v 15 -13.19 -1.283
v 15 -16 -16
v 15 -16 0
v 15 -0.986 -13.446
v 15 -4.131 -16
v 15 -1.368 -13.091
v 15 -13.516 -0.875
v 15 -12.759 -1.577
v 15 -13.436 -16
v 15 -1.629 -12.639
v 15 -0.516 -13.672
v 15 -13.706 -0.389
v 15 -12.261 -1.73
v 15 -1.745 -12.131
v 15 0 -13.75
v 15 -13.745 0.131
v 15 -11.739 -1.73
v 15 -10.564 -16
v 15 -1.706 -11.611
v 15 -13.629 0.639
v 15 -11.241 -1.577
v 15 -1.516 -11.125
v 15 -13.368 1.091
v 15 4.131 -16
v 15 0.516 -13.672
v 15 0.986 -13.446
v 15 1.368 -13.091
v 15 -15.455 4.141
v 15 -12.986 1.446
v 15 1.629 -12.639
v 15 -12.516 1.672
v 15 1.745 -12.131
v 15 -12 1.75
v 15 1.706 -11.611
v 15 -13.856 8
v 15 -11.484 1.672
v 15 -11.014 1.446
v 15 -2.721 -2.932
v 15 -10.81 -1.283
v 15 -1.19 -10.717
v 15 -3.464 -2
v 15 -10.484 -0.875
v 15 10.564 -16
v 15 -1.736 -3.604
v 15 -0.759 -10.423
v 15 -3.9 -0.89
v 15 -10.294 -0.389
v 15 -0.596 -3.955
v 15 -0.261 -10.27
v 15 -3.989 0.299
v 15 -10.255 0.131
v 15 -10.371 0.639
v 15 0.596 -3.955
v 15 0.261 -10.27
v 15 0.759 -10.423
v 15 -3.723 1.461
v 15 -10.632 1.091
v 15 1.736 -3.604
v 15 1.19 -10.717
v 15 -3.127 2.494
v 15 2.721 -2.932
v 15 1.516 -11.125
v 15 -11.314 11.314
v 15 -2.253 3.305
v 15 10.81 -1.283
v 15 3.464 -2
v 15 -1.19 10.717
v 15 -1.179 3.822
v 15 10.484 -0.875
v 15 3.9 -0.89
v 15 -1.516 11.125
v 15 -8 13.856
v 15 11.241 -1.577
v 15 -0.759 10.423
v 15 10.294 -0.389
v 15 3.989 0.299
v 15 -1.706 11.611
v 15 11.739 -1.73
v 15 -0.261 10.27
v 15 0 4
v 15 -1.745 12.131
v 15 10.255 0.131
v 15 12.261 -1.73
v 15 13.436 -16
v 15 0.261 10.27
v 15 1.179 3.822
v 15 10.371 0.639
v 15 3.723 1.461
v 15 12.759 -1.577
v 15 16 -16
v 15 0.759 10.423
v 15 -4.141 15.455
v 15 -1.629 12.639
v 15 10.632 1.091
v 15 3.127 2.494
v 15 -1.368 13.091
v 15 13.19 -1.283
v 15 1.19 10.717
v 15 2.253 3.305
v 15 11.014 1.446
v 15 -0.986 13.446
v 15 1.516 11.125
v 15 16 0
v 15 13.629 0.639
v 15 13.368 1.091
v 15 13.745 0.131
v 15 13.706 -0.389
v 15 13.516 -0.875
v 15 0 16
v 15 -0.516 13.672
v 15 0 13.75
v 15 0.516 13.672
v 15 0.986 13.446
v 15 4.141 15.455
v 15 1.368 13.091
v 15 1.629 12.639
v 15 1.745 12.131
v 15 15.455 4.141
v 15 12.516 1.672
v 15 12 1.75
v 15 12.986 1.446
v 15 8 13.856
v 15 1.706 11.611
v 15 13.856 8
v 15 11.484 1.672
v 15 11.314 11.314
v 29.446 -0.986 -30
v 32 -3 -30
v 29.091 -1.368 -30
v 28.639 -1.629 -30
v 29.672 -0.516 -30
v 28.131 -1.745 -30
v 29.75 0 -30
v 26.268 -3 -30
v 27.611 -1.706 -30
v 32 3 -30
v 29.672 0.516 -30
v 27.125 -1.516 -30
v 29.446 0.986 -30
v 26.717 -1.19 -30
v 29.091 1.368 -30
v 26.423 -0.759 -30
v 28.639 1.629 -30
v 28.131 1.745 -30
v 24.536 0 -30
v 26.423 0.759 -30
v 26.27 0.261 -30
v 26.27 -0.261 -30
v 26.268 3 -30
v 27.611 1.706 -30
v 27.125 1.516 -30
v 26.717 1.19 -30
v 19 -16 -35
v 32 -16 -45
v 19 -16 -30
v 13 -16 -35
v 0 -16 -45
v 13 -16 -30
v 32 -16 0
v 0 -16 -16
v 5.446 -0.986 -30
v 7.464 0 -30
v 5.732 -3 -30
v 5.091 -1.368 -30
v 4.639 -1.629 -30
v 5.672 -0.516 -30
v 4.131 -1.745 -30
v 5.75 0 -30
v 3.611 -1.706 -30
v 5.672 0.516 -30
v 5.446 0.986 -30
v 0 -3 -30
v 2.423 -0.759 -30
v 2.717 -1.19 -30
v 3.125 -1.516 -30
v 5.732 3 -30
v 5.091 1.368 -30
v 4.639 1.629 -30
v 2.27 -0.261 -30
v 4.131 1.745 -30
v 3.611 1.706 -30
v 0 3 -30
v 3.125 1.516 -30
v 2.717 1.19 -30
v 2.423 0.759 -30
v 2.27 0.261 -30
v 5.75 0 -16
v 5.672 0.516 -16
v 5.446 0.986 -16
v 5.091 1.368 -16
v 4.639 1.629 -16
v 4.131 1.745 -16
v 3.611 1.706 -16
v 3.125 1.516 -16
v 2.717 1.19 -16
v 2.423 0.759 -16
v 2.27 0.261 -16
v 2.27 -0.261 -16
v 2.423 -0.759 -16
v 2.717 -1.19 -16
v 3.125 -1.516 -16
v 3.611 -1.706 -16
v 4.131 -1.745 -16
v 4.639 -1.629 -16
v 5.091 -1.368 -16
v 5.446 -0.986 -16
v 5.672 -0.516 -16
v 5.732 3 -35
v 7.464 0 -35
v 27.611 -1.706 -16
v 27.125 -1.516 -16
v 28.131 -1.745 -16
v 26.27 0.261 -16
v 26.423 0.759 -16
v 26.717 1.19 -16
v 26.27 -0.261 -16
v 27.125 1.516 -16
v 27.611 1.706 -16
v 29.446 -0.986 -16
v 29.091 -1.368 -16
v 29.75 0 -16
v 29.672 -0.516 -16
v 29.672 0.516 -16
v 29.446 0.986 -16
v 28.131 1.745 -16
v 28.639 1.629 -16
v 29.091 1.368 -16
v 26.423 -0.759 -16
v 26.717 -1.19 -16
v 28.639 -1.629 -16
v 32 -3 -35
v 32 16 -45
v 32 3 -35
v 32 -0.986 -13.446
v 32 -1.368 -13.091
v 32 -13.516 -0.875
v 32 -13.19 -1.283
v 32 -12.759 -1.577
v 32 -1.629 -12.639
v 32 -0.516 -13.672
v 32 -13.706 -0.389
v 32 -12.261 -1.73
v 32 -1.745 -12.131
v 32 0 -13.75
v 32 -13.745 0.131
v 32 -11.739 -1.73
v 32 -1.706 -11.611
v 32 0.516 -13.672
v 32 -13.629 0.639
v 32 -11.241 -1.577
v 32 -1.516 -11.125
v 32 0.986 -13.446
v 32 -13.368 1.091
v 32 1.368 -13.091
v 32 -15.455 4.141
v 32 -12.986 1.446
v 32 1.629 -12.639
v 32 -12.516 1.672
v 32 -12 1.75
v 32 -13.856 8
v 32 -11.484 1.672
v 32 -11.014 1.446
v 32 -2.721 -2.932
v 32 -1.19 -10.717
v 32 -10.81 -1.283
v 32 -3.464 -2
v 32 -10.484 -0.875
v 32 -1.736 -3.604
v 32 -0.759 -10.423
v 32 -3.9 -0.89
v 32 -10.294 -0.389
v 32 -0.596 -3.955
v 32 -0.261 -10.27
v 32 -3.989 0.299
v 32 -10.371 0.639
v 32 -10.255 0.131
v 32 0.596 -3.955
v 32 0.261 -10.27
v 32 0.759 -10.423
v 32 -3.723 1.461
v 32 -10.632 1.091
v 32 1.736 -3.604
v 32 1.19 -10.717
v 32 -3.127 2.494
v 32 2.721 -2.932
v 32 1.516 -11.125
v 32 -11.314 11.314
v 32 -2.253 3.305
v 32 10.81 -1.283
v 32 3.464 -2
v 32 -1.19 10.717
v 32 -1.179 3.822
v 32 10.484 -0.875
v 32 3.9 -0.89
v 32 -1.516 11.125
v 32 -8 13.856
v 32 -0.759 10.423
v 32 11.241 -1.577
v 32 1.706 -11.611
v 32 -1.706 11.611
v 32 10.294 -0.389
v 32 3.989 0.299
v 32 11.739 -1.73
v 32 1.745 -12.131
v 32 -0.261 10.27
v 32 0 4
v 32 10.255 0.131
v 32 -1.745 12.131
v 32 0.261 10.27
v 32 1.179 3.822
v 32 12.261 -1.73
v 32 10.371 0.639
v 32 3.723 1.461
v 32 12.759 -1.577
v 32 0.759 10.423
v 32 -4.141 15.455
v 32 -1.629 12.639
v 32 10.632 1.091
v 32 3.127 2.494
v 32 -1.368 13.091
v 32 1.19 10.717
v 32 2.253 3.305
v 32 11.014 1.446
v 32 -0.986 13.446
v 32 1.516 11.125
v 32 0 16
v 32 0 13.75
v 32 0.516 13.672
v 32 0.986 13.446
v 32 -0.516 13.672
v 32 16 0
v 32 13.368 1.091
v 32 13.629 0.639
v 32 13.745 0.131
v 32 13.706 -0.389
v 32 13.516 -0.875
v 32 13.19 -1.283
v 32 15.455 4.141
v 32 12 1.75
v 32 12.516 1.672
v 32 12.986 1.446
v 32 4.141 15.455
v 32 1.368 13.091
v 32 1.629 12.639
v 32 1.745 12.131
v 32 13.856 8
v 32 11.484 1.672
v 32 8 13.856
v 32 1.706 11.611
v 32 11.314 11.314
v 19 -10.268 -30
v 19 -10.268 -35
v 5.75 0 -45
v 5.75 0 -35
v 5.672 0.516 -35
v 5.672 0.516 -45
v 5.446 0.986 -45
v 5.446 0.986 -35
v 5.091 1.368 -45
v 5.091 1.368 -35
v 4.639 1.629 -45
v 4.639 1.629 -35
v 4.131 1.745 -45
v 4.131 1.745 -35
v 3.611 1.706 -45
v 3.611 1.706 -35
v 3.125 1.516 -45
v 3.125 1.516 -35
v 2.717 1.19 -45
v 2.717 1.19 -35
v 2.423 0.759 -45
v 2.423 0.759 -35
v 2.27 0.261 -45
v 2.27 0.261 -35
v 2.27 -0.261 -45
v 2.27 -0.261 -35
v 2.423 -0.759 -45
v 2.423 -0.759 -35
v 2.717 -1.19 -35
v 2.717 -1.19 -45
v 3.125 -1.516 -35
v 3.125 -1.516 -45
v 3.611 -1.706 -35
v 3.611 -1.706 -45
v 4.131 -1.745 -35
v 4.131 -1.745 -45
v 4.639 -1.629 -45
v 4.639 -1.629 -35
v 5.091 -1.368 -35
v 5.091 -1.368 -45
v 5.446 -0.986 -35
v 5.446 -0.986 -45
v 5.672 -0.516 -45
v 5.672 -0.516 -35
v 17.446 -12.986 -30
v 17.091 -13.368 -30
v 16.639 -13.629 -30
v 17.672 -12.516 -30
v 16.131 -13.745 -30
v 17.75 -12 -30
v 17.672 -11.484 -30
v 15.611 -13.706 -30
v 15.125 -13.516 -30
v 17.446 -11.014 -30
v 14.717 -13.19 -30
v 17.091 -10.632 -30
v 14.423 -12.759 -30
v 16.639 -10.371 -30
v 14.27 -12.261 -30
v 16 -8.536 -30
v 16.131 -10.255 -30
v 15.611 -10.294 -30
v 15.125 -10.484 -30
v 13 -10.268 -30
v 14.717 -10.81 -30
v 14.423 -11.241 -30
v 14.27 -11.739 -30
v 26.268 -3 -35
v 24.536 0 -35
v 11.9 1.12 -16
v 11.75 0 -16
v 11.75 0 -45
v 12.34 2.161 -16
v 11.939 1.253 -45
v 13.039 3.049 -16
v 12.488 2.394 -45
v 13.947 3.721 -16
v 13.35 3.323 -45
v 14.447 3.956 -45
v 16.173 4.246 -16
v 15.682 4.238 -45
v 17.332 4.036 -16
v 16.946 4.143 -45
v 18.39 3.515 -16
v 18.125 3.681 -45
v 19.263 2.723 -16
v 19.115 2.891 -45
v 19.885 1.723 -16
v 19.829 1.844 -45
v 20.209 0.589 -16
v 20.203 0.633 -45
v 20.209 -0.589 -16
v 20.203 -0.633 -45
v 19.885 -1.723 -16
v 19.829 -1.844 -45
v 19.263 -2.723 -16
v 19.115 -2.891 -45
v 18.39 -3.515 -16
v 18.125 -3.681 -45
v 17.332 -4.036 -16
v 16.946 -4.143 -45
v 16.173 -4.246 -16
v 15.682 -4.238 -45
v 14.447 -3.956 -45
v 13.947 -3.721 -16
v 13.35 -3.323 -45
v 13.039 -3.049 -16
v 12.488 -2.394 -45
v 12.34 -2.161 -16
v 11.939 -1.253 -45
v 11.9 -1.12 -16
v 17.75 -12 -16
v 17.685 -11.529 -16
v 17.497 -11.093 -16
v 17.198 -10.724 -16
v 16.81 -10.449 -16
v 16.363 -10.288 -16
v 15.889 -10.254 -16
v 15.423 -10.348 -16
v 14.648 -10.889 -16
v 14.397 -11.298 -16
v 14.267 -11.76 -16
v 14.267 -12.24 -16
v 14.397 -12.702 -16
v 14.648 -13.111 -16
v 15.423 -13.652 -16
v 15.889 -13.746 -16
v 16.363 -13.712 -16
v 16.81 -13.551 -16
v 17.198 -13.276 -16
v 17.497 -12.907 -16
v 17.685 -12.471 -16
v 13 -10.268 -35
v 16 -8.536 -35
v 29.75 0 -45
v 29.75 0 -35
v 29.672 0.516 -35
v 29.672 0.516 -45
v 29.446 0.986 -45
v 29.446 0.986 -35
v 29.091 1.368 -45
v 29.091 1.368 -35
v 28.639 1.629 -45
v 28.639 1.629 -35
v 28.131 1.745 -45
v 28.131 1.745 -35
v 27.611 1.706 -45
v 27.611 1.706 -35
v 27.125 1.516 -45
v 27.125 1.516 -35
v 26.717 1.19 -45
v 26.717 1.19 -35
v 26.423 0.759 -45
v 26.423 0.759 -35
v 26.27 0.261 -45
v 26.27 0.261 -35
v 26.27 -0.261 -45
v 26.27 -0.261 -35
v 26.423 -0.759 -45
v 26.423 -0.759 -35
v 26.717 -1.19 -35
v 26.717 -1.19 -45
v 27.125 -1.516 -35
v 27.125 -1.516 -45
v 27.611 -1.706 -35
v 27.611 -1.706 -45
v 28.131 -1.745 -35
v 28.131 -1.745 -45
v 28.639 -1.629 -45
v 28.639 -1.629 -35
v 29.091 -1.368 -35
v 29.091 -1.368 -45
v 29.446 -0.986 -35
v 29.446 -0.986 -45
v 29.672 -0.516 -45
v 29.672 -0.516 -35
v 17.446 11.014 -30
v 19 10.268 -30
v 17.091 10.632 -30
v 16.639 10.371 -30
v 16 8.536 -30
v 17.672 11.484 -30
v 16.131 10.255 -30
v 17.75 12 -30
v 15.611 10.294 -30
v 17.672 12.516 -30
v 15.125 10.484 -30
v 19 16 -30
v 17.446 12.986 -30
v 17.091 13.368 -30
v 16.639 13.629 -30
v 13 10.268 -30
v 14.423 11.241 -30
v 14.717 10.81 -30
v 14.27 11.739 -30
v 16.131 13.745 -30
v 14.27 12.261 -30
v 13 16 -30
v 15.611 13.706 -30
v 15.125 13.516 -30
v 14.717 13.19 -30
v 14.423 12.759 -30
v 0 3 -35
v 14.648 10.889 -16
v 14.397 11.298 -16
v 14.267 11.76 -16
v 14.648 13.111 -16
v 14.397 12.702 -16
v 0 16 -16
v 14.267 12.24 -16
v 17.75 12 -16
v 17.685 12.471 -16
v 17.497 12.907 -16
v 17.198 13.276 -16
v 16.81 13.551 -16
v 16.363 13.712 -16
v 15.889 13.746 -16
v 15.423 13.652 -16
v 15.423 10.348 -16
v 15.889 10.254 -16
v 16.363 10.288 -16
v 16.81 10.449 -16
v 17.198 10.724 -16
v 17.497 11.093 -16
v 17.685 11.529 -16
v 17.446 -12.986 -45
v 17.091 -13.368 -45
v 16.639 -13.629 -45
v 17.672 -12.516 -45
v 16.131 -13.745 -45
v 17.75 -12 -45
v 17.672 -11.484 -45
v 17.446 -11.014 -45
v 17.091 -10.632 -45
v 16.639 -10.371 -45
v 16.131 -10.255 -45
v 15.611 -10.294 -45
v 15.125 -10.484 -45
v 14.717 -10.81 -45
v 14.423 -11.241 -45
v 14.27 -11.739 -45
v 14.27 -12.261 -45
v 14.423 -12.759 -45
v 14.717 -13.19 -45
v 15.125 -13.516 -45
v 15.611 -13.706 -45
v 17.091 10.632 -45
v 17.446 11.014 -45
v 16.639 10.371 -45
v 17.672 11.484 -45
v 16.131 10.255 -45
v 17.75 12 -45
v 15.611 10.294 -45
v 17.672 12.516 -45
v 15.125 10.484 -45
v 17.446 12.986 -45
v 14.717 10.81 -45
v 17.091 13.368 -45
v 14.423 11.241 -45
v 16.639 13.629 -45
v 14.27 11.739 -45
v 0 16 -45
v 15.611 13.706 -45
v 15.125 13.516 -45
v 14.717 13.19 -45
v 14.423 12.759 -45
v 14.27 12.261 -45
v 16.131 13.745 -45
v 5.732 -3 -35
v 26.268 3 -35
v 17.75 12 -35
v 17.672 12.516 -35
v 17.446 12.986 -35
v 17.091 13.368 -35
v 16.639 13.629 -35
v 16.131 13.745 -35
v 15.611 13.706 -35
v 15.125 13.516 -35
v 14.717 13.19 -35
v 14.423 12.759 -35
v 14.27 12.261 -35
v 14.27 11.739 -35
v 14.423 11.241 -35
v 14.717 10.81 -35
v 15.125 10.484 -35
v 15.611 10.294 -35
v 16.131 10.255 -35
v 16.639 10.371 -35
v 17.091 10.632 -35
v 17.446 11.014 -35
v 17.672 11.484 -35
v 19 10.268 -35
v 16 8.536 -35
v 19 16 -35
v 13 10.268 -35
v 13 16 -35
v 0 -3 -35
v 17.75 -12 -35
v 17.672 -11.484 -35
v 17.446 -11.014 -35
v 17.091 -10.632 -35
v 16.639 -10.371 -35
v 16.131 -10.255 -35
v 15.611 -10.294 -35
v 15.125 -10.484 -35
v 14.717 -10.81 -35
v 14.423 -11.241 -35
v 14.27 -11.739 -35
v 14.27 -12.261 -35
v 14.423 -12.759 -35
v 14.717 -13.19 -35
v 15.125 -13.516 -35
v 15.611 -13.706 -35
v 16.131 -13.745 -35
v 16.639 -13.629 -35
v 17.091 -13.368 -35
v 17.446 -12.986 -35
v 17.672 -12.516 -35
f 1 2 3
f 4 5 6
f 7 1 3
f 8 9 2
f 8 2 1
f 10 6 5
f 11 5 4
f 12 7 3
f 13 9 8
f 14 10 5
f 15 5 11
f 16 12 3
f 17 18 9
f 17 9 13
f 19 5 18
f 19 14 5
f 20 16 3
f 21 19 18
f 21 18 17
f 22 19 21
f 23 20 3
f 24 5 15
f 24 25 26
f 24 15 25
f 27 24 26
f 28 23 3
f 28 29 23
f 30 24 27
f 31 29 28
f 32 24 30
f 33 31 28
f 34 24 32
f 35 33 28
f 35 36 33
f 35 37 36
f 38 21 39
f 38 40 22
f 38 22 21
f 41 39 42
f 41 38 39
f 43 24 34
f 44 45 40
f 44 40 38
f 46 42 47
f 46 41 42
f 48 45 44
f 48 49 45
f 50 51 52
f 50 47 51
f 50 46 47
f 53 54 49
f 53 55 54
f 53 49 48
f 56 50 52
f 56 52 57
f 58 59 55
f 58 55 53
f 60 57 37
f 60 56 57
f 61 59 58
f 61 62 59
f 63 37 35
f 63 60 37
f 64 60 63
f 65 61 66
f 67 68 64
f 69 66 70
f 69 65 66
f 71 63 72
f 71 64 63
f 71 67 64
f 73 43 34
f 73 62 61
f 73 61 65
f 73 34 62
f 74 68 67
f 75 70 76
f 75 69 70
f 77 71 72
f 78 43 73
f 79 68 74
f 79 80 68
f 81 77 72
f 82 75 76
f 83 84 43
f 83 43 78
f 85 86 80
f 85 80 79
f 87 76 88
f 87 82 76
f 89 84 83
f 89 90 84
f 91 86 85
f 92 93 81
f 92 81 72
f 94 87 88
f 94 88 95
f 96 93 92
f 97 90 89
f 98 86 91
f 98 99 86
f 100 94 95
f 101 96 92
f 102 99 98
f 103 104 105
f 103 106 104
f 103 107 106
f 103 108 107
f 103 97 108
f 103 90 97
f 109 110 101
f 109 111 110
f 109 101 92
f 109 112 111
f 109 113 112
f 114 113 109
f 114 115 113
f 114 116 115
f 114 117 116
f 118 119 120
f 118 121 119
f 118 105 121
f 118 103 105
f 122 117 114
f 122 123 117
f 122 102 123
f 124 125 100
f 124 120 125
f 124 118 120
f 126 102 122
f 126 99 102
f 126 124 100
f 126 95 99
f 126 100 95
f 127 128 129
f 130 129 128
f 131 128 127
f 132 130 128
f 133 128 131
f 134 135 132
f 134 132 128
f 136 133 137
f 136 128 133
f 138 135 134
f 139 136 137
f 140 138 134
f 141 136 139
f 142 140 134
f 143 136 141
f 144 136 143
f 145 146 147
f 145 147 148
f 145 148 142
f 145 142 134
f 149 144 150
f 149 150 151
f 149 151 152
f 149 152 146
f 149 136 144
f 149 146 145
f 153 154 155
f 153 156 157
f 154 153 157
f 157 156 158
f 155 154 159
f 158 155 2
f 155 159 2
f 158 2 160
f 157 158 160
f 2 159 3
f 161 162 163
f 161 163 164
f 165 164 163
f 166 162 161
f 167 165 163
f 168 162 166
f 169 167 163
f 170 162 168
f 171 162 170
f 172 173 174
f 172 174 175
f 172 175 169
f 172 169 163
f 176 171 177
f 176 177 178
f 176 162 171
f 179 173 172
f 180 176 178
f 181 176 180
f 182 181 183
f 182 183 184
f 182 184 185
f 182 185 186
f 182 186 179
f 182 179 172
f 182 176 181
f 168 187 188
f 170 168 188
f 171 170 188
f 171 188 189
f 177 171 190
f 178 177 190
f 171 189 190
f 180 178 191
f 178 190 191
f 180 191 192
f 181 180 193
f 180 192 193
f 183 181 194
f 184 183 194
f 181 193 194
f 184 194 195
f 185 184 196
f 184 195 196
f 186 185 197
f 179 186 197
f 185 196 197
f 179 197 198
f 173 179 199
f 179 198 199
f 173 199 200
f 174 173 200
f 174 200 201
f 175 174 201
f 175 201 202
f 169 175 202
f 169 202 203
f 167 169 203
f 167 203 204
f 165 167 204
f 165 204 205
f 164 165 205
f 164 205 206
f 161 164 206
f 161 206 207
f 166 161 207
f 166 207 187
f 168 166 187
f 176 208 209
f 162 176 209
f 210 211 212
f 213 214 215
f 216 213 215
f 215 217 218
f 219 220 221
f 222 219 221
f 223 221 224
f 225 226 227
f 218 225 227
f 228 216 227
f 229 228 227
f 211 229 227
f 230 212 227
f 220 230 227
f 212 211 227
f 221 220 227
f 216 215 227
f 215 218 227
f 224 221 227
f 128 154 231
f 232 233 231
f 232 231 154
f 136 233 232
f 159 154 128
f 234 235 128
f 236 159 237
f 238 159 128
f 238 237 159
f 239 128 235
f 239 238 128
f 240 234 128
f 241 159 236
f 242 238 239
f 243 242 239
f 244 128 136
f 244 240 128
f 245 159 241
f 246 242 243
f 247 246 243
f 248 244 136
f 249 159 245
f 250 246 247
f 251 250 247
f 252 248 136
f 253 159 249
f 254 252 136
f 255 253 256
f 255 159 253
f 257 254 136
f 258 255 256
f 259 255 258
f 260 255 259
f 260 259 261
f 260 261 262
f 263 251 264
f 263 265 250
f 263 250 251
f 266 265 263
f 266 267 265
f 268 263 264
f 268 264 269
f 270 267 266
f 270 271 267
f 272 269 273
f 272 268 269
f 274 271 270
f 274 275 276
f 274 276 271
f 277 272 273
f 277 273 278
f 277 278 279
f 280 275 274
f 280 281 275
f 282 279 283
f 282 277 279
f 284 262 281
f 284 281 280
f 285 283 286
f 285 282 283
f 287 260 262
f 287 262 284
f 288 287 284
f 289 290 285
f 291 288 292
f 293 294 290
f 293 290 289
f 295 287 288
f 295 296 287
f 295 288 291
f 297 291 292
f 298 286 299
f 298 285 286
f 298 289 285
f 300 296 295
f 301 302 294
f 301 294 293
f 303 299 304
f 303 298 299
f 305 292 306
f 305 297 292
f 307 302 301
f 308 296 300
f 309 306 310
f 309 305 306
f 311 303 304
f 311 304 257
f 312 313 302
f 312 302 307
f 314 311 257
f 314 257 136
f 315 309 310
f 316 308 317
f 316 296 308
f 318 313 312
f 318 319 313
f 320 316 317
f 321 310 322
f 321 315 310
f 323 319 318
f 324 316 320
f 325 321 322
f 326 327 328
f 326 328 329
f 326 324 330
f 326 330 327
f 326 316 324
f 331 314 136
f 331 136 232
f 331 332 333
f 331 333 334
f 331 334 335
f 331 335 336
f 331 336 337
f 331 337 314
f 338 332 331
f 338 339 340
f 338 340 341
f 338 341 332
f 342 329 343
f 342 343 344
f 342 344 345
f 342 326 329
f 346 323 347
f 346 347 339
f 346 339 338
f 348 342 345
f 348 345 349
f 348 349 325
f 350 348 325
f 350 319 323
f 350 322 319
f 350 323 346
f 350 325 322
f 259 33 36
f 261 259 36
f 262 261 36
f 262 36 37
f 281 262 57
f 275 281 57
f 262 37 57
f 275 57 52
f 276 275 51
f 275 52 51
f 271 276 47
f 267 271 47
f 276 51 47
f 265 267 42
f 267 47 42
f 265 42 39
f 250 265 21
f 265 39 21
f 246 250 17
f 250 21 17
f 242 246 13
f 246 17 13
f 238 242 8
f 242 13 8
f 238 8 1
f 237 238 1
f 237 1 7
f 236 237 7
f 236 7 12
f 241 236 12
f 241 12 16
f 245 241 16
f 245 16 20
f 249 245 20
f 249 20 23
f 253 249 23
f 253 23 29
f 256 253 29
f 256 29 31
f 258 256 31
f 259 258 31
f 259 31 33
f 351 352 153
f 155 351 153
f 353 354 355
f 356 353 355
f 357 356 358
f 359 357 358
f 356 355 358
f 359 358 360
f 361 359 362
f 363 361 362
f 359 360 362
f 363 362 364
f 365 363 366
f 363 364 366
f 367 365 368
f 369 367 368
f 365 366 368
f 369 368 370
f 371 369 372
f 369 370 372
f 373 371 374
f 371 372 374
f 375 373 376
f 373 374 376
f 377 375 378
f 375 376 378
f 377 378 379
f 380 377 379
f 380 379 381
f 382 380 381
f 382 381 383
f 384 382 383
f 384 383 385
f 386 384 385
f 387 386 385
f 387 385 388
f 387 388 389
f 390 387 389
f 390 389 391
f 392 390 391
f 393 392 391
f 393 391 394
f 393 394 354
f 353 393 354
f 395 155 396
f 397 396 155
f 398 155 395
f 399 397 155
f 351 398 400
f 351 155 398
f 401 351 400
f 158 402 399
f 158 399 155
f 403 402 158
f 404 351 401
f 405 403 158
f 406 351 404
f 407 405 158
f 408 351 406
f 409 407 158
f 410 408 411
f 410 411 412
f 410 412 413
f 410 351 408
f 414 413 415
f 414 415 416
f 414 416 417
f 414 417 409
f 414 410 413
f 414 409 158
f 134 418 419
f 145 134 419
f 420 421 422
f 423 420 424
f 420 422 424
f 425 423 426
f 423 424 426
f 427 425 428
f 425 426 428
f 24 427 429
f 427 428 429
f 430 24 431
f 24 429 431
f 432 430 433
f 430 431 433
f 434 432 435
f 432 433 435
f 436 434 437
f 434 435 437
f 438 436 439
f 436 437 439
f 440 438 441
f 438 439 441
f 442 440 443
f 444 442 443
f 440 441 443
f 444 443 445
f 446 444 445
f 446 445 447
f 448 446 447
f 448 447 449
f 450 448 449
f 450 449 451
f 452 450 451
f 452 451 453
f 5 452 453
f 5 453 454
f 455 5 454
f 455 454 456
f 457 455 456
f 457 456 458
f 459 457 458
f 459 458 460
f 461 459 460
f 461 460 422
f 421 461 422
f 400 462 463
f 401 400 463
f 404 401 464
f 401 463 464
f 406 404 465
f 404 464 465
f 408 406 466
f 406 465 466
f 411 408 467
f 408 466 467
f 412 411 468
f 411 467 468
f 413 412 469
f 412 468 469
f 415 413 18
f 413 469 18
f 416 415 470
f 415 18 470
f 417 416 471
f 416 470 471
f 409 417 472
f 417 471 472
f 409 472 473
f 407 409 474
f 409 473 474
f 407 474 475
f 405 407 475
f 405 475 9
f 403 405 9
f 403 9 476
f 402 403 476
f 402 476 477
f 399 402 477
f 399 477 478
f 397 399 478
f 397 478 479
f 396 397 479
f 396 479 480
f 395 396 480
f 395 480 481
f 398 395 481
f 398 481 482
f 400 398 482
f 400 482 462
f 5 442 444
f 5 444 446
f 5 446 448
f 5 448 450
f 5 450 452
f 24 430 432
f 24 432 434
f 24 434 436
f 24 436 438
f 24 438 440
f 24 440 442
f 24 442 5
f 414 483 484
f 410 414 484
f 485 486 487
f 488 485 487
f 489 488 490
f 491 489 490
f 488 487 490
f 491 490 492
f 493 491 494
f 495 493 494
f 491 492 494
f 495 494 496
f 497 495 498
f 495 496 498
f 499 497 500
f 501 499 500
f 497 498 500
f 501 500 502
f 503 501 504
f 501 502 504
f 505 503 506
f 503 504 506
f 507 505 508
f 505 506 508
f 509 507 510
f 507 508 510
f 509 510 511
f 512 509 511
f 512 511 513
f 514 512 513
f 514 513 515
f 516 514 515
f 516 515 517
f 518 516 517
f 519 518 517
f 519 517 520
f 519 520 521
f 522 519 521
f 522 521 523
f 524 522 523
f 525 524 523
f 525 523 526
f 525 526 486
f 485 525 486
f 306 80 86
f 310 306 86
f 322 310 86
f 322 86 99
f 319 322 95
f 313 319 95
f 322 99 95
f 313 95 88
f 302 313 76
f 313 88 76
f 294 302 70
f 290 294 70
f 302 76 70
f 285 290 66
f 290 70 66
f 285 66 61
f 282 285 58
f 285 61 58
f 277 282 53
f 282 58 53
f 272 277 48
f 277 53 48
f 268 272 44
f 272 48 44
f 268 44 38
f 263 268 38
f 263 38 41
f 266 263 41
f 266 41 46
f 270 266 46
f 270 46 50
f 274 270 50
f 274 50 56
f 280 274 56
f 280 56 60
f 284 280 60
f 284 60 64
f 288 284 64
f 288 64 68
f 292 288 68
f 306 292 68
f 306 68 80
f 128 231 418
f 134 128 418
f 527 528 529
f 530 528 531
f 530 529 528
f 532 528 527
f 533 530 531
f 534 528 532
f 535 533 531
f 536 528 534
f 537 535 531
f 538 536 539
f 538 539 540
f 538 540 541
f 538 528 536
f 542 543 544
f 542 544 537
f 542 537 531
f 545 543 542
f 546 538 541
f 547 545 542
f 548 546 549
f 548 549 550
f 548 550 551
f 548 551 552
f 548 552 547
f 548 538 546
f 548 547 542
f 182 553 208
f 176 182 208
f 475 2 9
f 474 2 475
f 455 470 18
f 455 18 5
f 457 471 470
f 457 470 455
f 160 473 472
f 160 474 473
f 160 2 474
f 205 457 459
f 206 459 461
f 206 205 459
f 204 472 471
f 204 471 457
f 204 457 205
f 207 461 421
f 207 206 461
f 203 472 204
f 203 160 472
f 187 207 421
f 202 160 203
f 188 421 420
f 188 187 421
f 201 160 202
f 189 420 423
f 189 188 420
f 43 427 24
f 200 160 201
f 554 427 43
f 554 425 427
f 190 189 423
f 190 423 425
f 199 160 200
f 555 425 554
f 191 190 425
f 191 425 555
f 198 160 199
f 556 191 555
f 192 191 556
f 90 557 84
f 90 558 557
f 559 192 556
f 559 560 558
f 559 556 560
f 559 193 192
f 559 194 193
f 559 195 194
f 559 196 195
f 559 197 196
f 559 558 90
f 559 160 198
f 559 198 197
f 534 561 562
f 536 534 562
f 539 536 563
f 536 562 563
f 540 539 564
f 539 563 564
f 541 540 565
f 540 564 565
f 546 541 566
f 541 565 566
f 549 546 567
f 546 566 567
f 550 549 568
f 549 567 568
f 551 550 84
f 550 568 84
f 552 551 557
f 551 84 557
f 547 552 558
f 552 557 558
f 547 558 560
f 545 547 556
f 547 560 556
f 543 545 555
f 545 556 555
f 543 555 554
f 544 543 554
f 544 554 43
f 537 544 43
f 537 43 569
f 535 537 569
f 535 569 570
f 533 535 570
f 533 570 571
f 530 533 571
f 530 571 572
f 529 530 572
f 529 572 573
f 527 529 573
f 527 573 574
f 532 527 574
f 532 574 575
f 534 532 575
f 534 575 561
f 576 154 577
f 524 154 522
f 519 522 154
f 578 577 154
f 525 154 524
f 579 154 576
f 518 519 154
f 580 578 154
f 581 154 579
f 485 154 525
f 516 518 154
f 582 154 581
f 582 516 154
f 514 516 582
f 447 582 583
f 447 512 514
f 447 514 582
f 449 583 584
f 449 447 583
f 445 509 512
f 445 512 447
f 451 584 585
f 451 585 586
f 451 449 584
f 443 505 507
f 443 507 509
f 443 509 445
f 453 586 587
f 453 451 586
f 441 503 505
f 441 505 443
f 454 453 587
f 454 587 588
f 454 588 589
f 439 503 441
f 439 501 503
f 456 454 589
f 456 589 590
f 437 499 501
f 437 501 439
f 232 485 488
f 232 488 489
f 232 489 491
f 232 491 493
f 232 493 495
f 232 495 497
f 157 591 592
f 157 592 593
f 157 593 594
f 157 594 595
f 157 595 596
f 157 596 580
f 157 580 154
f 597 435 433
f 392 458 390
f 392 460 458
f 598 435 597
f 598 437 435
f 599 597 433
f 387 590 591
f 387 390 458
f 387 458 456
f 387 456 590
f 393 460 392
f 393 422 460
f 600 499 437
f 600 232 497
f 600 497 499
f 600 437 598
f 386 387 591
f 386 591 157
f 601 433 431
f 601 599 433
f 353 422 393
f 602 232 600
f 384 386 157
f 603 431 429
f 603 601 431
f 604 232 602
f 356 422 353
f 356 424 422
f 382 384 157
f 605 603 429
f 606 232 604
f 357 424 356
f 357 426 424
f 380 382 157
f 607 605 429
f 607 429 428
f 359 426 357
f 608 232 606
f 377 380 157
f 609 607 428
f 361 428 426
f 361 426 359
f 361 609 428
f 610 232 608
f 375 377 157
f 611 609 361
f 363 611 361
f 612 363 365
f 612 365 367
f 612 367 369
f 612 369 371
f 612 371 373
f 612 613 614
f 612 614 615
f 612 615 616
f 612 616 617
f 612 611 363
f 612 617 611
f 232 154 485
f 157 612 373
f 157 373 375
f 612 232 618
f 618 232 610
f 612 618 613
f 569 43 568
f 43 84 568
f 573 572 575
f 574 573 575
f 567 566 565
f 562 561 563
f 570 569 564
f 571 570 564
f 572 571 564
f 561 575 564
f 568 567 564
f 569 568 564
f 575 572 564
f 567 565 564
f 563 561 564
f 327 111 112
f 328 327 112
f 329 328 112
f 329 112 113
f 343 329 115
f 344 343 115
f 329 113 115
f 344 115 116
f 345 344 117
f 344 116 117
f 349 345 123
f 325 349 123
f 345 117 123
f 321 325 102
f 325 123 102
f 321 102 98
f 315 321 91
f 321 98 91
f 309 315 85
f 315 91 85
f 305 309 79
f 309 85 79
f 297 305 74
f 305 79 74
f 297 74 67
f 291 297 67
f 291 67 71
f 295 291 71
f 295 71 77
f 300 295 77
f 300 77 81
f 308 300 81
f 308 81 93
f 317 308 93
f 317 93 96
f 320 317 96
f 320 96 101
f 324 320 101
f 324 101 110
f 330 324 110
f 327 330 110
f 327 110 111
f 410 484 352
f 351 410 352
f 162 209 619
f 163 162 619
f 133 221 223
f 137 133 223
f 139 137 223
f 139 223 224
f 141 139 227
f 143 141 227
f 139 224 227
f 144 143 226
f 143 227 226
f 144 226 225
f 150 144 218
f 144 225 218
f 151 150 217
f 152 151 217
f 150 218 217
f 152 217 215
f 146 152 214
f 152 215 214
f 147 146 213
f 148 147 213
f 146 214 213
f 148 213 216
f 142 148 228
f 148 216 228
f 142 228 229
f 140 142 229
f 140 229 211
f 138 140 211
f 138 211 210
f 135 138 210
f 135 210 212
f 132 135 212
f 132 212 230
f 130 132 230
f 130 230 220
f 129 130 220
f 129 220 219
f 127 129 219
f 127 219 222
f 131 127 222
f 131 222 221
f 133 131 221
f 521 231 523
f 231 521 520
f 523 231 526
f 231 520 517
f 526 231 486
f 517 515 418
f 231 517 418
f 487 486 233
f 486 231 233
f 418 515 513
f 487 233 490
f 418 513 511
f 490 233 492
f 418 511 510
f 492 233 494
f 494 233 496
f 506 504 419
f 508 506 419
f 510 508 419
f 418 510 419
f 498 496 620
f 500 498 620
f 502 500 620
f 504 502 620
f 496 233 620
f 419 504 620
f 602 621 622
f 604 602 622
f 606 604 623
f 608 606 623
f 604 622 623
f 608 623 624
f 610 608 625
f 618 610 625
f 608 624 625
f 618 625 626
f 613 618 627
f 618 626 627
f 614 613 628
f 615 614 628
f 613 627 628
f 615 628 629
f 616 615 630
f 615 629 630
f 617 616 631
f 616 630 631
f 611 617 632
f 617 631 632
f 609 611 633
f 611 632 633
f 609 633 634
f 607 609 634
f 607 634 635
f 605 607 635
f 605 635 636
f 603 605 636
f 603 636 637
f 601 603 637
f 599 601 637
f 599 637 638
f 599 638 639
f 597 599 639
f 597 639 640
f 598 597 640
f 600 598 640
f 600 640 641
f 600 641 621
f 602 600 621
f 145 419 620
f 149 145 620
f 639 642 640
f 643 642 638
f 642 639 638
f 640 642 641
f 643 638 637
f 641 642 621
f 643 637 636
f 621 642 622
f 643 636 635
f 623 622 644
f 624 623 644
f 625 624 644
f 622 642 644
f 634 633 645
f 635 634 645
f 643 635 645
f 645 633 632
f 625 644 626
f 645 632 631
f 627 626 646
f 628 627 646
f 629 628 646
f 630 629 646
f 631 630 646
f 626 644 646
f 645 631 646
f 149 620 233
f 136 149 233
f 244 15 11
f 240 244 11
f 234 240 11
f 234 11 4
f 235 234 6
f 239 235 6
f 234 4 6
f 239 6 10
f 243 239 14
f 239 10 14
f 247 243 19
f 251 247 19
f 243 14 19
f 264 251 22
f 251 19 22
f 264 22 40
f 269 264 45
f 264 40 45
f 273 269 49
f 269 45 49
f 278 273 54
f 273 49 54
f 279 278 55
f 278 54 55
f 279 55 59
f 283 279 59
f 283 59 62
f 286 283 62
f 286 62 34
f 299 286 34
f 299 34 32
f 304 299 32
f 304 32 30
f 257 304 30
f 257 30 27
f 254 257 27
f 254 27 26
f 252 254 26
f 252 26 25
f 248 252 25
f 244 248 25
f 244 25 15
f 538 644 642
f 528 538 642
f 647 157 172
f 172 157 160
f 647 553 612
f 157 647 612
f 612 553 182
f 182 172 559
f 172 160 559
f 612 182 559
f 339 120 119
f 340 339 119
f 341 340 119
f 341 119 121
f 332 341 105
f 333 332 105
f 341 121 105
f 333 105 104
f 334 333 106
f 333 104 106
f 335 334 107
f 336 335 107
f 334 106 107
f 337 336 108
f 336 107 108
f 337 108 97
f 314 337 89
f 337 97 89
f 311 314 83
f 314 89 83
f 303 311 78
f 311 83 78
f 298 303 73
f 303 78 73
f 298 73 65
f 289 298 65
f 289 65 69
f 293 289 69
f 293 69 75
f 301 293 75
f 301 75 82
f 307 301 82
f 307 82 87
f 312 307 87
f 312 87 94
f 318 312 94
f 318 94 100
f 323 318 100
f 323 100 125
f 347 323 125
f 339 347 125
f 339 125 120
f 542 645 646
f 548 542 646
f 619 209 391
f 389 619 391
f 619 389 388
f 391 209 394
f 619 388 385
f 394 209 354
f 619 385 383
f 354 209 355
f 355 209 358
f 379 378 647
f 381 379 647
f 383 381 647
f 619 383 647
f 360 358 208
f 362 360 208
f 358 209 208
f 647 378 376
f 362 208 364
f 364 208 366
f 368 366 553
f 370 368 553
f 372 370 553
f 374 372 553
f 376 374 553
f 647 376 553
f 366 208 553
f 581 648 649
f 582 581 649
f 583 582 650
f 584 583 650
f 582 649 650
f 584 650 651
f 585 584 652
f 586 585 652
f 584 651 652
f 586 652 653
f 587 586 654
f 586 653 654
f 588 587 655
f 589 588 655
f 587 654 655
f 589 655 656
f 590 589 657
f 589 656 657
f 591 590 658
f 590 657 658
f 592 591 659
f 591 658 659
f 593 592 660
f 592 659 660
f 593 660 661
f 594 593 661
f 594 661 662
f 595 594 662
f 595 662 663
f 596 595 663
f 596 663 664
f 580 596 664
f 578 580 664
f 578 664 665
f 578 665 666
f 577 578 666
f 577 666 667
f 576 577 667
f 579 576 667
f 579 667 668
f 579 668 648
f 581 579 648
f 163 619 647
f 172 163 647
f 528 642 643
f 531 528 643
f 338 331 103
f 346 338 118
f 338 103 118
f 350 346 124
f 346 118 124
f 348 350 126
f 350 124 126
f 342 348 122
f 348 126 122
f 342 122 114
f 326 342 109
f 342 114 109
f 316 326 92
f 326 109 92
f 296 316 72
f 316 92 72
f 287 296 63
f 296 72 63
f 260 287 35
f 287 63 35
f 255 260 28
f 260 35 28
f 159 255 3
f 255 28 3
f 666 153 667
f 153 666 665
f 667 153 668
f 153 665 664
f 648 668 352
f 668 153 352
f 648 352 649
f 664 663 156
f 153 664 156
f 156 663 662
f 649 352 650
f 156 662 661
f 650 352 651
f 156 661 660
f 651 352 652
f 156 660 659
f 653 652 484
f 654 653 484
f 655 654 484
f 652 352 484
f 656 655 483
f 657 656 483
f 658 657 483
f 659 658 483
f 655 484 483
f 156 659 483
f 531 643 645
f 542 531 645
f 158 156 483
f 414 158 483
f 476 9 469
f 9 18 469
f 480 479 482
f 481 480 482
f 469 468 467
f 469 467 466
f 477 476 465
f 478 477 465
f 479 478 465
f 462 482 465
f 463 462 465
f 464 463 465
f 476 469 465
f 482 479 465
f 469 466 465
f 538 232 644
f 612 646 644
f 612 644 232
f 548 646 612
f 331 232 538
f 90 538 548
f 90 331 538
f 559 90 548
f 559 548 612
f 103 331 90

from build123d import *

# Parameters (mm, degrees)
BOSS_EXTRUDE1_DEPTH = 32
SKETCH4_R           = 16
CUT_EXTRUDE3_DEPTH  = 15
SKETCH5_R           = 7
SKETCH5_R_2         = 4
BOSS_EXTRUDE2_DEPTH = 17
SKETCH15_W          = 16
SKETCH15_H          = 32
CUT_EXTRUDE6_DEPTH  = 15
SKETCH16_W          = 32
SKETCH16_H          = 32
BOSS_EXTRUDE6_DEPTH = 20
SKETCH17_R          = 1.75
CUT_EXTRUDE8_DEPTH  = 49
SKETCH18_R          = 1.75
CUT_EXTRUDE9_DEPTH  = 51.695167423
CUT_EXTRUDE10_START = -10
CUT_EXTRUDE10_DEPTH = 5
SKETCH20_R          = 4.25
CUT_EXTRUDE11_DEPTH = 29


with BuildPart() as part:
    # Sketch1 → Boss-Extrude1 (new body)
    with BuildSketch(Plane(origin=(0, 0, 0), x_dir=(0, -1, 0), z_dir=(1, 0, 0))):
        with BuildLine():
            ThreePointArc((-16, 0), (0, 16), (16, 0))
            Line((16, 0), (16, 25))
            Line((16, 25), (-16, 25))
            Line((-16, 25), (-16, 0))
        make_face()
        with BuildLine():
            ThreePointArc((-4.5, 0), (0, 4.5), (4.5, 0))
            Line((4.5, 0), (16, 0))
            ThreePointArc((16, 0), (0, 16), (-16, 0))
            Line((-16, 0), (-4.5, 0))
        make_face()
        with BuildLine():
            Line((16, 0), (4.5, 0))
            ThreePointArc((4.5, 0), (0, -4.5), (-4.5, 0))
            Line((-4.5, 0), (-16, 0))
            ThreePointArc((-16, 0), (0, -16), (16, 0))
        make_face()
        with BuildLine():
            ThreePointArc((-4.5, 0), (0, 4.5), (4.5, 0))
            Line((4.5, 0), (16, 0))
            ThreePointArc((16, 0), (0, 16), (-16, 0))
            Line((-16, 0), (-4.5, 0))
        make_face()
        with BuildLine():
            Line((16, 0), (4.5, 0))
            ThreePointArc((4.5, 0), (0, -4.5), (-4.5, 0))
            Line((-4.5, 0), (-16, 0))
            ThreePointArc((-16, 0), (0, -16), (16, 0))
        make_face()
    extrude(amount=BOSS_EXTRUDE1_DEPTH)

    # Sketch4 → Cut-Extrude3 (cut)
    with BuildSketch(Plane.ZY):
        Circle(SKETCH4_R)
    extrude(amount=-CUT_EXTRUDE3_DEPTH, mode=Mode.SUBTRACT)

    # Sketch5 → Boss-Extrude2 (add)
    with BuildSketch(Plane.ZY.offset(-15)):
        Circle(SKETCH5_R)
        Circle(SKETCH5_R_2, mode=Mode.SUBTRACT)
    extrude(amount=-BOSS_EXTRUDE2_DEPTH)

    # Sketch15 → Cut-Extrude6 (cut)
    with BuildSketch(Plane.ZY):
        with Locations((-8, 0)):
            Rectangle(SKETCH15_W, SKETCH15_H)
    extrude(amount=-CUT_EXTRUDE6_DEPTH, mode=Mode.SUBTRACT)

    # Sketch16 → Boss-Extrude6 (add)
    with BuildSketch(Plane(origin=(0, 0, -25), x_dir=(-1, 0, 0), z_dir=(0, 0, -1))):
        with Locations((-16, 0)):
            Rectangle(SKETCH16_W, SKETCH16_H)
    extrude(amount=BOSS_EXTRUDE6_DEPTH)

    # Sketch17 → Cut-Extrude8 (cut, through all)
    with BuildSketch(Plane.XY.offset(-16)):
        with Locations((4, 0)):
            Circle(SKETCH17_R)
        with Locations((16, 12)):
            Circle(SKETCH17_R)
        with Locations((28, 0)):
            Circle(SKETCH17_R)
        with Locations((16, -12)):
            Circle(SKETCH17_R)
    extrude(amount=-CUT_EXTRUDE8_DEPTH, mode=Mode.SUBTRACT)

    # Sketch18 → Cut-Extrude9 (cut, through all)
    with BuildSketch(Plane.ZY.offset(-15)):
        with Locations((0, 12)):
            Circle(SKETCH18_R)
        with Locations((0, -12)):
            Circle(SKETCH18_R)
        with Locations((12, 0)):
            Circle(SKETCH18_R)
        with Locations(Location((-12, 0, 0), (0, 0, 180))):
            Circle(SKETCH18_R)
    extrude(amount=-CUT_EXTRUDE9_DEPTH, mode=Mode.SUBTRACT)

    # Sketch19 → Cut-Extrude10 (cut)
    with BuildSketch(Plane(origin=(0, 0, -45), x_dir=(-1, 0, 0), z_dir=(0, 0, -1)).offset(CUT_EXTRUDE10_START)):
        Polygon((0, 3), (-5.732050808, 3), (-7.464101615, 0), (-5.732050808, -3), (0, -3), align=None)
        Polygon((-16, -8.535898385), (-19, -10.267949192), (-19, -16), (-13, -16), (-13, -10.267949192), align=None)
        Polygon((-24.535898385, 0), (-26.267949192, 3), (-32, 3), (-32, -3), (-26.267949192, -3), align=None)
        Polygon((-16, 8.535898385), (-13, 10.267949192), (-13, 16), (-19, 16), (-19, 10.267949192), align=None)
    extrude(amount=-CUT_EXTRUDE10_DEPTH, mode=Mode.SUBTRACT)

    # Sketch20 → Cut-Extrude11 (cut)
    with BuildSketch(Plane(origin=(0, 0, -45), x_dir=(-1, 0, 0), z_dir=(0, 0, -1))):
        with Locations((-16, 0)):
            Circle(SKETCH20_R)
    extrude(amount=-CUT_EXTRUDE11_DEPTH, mode=Mode.SUBTRACT)


solid = part.part
